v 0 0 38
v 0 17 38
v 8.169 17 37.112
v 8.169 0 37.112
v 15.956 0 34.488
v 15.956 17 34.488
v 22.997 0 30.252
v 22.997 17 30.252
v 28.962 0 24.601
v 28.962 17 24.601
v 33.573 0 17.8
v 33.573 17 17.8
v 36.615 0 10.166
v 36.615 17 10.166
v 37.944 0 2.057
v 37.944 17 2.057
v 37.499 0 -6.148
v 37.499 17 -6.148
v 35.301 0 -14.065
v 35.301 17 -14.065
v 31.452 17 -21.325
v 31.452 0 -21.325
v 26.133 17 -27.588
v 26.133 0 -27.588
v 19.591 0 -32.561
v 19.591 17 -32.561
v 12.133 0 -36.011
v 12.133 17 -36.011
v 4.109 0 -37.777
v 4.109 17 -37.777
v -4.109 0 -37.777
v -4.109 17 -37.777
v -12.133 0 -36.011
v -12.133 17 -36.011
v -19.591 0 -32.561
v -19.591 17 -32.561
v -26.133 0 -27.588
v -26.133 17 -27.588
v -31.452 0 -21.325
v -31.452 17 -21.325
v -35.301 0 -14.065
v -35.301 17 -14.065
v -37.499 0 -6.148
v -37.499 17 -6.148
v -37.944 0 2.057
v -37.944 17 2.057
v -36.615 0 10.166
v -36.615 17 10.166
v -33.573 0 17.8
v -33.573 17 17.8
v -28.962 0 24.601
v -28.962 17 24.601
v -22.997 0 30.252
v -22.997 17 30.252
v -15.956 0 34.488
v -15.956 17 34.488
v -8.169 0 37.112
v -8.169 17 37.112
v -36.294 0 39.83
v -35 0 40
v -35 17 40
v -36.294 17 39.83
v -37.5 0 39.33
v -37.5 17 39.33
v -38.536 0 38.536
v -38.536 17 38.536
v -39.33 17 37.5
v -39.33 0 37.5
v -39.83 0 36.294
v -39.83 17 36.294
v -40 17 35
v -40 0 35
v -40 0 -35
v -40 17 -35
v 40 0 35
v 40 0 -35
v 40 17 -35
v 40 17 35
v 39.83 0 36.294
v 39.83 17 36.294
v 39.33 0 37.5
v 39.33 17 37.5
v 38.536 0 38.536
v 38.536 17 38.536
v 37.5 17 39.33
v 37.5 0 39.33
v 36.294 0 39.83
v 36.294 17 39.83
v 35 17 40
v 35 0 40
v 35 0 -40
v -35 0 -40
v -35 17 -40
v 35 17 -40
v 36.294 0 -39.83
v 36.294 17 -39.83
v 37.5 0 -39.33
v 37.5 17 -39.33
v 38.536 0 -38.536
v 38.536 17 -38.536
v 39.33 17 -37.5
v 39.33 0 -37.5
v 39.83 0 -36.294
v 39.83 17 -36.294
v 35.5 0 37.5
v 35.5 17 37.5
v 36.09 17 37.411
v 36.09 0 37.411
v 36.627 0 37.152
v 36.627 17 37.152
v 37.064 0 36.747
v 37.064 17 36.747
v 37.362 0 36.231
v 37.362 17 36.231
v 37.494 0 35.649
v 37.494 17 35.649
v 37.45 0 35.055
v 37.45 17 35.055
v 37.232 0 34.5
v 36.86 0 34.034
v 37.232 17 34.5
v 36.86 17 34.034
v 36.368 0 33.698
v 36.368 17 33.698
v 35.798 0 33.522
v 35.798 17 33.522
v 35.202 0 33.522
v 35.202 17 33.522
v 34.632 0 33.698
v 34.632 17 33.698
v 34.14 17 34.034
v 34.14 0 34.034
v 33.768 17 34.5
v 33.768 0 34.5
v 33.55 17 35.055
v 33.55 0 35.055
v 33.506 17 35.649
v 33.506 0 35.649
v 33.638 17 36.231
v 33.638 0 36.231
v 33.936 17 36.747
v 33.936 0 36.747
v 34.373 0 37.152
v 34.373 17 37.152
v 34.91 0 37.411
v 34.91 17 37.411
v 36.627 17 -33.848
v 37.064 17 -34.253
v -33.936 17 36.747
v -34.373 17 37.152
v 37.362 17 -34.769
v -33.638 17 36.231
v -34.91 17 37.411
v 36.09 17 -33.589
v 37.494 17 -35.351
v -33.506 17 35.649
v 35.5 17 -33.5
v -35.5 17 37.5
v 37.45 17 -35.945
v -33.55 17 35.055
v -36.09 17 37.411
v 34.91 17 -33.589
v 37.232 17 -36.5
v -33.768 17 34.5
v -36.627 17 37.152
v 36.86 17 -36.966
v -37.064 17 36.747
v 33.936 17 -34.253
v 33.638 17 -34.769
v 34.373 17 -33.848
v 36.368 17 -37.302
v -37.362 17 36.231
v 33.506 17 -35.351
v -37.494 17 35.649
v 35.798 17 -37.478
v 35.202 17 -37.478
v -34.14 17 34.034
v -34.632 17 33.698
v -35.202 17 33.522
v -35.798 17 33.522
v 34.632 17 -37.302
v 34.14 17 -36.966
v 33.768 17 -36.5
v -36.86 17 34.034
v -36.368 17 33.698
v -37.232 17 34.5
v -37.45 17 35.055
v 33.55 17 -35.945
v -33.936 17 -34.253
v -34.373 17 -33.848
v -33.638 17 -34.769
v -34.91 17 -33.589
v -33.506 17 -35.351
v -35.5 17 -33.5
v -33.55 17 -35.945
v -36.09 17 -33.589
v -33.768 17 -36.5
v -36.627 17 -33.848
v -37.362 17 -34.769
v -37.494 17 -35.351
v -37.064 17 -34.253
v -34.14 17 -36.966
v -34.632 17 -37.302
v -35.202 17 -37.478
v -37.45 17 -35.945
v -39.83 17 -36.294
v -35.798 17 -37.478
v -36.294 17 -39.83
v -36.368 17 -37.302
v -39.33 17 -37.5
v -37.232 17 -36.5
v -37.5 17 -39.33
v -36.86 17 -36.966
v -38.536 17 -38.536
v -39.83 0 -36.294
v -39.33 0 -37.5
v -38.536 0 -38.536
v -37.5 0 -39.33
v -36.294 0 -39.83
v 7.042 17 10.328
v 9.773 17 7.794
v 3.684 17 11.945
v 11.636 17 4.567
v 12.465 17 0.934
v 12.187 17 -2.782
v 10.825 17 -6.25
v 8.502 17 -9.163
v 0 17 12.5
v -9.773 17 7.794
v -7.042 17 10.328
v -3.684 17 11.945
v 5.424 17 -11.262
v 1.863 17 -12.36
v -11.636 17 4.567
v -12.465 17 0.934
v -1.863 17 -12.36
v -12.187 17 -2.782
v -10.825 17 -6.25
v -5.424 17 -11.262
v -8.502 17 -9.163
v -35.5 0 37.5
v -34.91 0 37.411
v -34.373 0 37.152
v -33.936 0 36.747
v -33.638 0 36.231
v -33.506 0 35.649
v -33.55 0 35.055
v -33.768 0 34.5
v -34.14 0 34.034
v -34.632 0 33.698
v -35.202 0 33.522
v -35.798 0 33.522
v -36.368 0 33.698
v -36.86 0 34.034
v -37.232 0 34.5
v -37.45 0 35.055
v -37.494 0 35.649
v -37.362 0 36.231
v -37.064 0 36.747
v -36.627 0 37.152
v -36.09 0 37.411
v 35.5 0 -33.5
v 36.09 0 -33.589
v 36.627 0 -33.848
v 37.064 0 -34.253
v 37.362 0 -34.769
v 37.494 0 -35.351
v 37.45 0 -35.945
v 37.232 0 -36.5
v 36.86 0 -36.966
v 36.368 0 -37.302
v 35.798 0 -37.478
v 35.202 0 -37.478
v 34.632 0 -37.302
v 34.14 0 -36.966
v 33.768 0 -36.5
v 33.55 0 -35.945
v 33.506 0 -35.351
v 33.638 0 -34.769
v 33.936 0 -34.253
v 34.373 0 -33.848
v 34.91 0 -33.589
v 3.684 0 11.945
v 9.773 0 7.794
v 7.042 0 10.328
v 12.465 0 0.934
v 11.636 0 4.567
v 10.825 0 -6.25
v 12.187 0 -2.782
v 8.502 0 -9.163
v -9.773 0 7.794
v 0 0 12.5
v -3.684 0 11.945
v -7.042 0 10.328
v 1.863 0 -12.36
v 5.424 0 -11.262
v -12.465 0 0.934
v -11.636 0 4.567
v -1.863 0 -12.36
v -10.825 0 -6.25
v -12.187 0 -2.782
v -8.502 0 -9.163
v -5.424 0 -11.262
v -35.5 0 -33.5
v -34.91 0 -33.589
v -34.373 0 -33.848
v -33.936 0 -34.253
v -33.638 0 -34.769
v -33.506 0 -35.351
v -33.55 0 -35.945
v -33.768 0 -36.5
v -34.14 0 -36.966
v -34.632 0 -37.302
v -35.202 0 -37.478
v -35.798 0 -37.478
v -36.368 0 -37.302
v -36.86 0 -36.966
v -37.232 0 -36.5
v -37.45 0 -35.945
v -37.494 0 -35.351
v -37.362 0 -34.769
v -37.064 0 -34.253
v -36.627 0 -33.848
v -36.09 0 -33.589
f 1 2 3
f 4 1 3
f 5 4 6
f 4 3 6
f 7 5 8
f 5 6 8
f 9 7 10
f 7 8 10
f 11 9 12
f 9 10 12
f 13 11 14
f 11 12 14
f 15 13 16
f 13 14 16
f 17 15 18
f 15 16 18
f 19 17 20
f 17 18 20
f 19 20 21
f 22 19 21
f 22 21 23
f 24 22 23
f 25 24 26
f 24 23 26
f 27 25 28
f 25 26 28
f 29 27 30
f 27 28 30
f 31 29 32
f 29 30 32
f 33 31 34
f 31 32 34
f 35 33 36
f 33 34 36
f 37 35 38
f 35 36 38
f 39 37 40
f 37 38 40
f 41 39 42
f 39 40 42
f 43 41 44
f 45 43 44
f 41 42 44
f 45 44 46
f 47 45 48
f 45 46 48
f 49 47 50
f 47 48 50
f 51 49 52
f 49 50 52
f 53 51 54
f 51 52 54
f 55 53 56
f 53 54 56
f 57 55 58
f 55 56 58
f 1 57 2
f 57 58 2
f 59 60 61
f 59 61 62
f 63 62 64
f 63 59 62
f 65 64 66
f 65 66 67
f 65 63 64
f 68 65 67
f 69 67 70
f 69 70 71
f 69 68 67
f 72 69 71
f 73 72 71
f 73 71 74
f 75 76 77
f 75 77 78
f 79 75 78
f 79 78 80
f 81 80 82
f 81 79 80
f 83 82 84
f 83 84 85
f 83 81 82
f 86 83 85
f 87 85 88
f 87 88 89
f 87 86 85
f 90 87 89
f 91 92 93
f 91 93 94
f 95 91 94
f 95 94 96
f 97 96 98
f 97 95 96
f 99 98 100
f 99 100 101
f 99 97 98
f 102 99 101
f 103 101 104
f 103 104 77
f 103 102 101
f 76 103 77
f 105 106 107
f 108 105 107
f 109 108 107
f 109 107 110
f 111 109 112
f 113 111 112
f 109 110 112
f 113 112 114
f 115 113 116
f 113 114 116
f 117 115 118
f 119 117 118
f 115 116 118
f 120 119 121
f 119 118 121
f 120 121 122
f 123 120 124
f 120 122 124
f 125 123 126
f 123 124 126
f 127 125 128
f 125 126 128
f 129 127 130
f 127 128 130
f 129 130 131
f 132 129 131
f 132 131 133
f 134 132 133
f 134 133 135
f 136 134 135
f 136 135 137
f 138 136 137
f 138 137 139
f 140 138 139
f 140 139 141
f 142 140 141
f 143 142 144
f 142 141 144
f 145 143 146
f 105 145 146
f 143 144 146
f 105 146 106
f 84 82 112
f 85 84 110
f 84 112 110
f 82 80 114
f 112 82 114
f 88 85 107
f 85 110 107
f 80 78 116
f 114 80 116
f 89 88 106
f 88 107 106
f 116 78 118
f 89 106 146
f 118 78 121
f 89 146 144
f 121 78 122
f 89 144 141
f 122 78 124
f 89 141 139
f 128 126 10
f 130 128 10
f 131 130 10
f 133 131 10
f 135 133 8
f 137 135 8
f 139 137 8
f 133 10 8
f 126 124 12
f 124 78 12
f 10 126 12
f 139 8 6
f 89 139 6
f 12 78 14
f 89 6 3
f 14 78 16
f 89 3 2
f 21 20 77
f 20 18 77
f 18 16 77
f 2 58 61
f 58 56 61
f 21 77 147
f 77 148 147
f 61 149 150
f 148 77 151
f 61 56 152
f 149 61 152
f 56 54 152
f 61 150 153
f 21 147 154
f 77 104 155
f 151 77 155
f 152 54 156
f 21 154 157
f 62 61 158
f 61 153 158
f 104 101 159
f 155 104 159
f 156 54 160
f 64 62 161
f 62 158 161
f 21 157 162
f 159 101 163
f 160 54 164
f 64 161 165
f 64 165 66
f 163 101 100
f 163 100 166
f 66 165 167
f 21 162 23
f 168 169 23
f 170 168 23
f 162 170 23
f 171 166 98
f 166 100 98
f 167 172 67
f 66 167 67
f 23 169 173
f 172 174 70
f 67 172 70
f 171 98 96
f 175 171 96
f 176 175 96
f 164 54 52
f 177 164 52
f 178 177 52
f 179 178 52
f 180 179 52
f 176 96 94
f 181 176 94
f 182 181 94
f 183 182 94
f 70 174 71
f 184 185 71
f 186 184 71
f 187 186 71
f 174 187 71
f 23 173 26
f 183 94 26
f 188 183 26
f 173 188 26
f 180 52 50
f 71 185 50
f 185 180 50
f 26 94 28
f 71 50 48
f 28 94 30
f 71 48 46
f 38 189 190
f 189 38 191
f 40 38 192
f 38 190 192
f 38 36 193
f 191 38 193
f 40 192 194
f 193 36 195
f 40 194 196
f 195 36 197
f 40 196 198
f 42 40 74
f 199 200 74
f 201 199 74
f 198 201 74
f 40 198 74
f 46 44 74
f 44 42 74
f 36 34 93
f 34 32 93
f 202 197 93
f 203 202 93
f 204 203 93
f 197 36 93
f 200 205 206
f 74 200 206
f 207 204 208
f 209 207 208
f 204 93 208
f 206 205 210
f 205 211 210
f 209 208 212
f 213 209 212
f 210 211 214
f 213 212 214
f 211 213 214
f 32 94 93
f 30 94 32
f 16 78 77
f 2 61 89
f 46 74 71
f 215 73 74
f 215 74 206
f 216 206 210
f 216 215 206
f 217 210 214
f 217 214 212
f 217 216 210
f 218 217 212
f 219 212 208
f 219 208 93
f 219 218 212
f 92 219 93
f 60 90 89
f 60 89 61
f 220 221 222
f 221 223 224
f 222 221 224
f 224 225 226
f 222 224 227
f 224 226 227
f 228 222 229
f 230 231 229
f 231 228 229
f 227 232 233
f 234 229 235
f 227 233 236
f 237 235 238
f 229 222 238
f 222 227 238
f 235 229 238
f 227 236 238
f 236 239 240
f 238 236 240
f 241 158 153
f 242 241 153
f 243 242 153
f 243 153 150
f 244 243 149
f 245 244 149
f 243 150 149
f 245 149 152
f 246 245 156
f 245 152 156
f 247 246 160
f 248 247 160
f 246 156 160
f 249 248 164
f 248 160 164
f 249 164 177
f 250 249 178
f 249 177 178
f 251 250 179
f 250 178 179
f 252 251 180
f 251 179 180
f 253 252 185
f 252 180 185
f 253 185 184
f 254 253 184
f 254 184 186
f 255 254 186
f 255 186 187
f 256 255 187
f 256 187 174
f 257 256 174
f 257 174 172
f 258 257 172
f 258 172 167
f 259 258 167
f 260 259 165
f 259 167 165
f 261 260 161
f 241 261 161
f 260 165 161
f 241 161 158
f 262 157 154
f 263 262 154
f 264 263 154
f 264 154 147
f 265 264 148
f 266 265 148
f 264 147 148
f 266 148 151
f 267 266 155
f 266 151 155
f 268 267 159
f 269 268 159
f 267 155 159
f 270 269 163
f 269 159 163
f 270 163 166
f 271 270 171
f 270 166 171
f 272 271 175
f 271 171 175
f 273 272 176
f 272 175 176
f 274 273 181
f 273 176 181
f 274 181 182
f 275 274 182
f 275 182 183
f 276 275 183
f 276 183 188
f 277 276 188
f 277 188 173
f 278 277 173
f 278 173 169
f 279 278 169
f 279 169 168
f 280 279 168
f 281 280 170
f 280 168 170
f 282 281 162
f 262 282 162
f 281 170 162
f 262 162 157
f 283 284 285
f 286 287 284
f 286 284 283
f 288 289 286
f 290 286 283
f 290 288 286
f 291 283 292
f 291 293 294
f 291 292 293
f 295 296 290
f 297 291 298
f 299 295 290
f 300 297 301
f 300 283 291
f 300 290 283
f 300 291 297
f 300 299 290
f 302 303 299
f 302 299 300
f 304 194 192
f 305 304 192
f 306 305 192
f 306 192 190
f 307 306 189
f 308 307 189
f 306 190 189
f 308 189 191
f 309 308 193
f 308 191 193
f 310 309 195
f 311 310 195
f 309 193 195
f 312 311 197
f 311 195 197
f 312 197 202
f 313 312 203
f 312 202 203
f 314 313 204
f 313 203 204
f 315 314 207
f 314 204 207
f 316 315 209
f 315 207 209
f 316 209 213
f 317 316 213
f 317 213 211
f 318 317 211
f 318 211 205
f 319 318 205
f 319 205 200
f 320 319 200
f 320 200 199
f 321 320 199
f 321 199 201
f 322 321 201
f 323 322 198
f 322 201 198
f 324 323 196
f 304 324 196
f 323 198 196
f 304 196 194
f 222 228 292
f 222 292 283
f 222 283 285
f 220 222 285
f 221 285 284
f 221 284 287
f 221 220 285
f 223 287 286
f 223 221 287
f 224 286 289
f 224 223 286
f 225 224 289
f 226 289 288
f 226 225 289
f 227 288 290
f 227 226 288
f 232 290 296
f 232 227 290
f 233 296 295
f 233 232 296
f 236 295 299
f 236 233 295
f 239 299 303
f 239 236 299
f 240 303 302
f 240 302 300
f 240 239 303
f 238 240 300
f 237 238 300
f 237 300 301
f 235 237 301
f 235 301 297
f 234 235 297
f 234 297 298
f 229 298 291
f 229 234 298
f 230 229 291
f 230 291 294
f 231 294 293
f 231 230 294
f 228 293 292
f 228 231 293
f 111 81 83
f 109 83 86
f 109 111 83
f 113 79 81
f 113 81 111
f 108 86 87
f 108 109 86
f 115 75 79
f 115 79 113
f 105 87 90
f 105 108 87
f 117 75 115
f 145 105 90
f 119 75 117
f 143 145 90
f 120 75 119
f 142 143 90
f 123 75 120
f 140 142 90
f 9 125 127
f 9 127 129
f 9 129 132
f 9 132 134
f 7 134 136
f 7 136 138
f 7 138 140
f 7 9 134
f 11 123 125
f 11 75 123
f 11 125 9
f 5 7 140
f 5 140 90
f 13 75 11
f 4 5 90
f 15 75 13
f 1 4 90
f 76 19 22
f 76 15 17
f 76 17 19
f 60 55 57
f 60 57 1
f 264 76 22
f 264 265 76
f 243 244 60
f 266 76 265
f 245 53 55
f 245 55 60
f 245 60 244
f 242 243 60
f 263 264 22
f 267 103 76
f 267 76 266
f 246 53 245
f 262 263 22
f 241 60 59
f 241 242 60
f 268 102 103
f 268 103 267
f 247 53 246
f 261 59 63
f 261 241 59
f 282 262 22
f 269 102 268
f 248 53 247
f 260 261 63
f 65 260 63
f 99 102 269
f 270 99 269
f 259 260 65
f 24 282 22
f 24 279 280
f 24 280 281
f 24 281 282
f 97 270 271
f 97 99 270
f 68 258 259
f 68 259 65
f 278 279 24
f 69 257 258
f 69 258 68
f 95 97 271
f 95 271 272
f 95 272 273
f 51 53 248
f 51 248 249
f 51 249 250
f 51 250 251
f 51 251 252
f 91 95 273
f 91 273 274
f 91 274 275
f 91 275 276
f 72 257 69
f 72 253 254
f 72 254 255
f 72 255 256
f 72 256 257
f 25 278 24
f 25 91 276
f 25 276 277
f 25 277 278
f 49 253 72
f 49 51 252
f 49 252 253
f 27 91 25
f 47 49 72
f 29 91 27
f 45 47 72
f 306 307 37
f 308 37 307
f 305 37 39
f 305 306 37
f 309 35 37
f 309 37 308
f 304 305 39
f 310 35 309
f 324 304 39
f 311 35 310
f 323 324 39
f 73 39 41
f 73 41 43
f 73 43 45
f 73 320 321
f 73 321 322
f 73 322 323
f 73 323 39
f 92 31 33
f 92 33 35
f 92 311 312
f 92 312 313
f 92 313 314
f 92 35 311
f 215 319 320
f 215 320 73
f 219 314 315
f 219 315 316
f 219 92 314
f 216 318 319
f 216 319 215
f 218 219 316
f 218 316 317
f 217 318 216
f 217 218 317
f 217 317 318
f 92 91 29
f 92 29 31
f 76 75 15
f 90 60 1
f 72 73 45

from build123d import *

# Parameters (mm, degrees)
EXTRUDE_1_DEPTH     = 17
SKETCH_2_R          = 12.5
CUT_EXTRUDE_1_DEPTH = 17
SKETCH_3_R          = 38
EXTRUDE_3_DEPTH     = 17
SKETCH_4_R          = 2
CUT_EXTRUDE_2_DEPTH = 17


with BuildPart() as part:
    # 草图1 → 拉伸1 (new body)
    with BuildSketch(Plane(origin=(0, 0, 0), x_dir=(1, 0, 0), z_dir=(0, 1, 0))):
        with BuildLine():
            Line((-35, 40), (35, 40))
            ThreePointArc((35, 40), (38.535533906, 38.535533906), (40, 35))
            Line((40, 35), (40, -35))
            ThreePointArc((40, -35), (38.535533906, -38.535533906), (35, -40))
            Line((35, -40), (-35, -40))
            ThreePointArc((-35, -40), (-38.535533906, -38.535533906), (-40, -35))
            Line((-40, -35), (-40, 35))
            ThreePointArc((-40, 35), (-38.535533906, 38.535533906), (-35, 40))
        make_face()
    extrude(amount=EXTRUDE_1_DEPTH)

    # 草图2 → 切除-拉伸1 (cut)
    with BuildSketch(Plane(origin=(0, 17, 0), x_dir=(-1, 0, 0), z_dir=(0, 1, 0))):
        with BuildLine():
            Line((-35, -38), (35, -38))
            ThreePointArc((35, -38), (37.121320344, -37.121320344), (38, -35))
            Line((38, -35), (38, 35))
            ThreePointArc((38, 35), (37.121320344, 37.121320344), (35, 38))
            Line((35, 38), (-35, 38))
            ThreePointArc((-35, 38), (-37.121320344, 37.121320344), (-38, 35))
            Line((-38, 35), (-38, -35))
            ThreePointArc((-38, -35), (-37.121320344, -37.121320344), (-35, -38))
        make_face()
        with Locations(Location((0, 0, 0), (0, 0, 90))):
            Circle(SKETCH_2_R, mode=Mode.SUBTRACT)
    extrude(amount=-CUT_EXTRUDE_1_DEPTH, mode=Mode.SUBTRACT)


with BuildPart() as cut_extrude_1_piece_1:
    # of the separate pieces the step leaves, piece 1, a body of its own (cut_extrude_1_pieces)
    add(part.part.solids().sort_by_distance((-35, 0, -40))[0])

    # 草图3 → 拉伸3 (add)
    with BuildSketch(Plane(origin=(0, 17, 0), x_dir=(-1, 0, 0), z_dir=(0, 1, 0))):
        with BuildLine():
            Line((40, -35), (40, 35))
            ThreePointArc((40, 35), (38.535533906, 38.535533906), (35, 40))
            Line((35, 40), (-35, 40))
            ThreePointArc((-35, 40), (-38.535533906, 38.535533906), (-40, 35))
            Line((-40, 35), (-40, -35))
            ThreePointArc((-40, -35), (-38.535533906, -38.535533906), (-35, -40))
            Line((-35, -40), (35, -40))
            ThreePointArc((35, -40), (38.535533906, -38.535533906), (40, -35))
        make_face()
        with Locations(Location((0, 0, 0), (0, 0, 90))):
            Circle(SKETCH_3_R, mode=Mode.SUBTRACT)
    extrude(amount=-EXTRUDE_3_DEPTH)

    # 草图4 → 切除-拉伸2 (cut)
    with BuildSketch(Plane(origin=(0, 17, 0), x_dir=(-1, 0, 0), z_dir=(0, 1, 0))):
        with Locations(Location((-35.5, -35.5, 0), (0, 0, 90))):
            Circle(SKETCH_4_R)
        with Locations(Location((-35.5, 35.5, 0), (0, 0, 90))):
            Circle(SKETCH_4_R)
        with Locations(Location((35.5, 35.5, 0), (0, 0, 90))):
            Circle(SKETCH_4_R)
        with Locations(Location((35.5, -35.5, 0), (0, 0, 90))):
            Circle(SKETCH_4_R)
    extrude(amount=-CUT_EXTRUDE_2_DEPTH, mode=Mode.SUBTRACT)


with BuildPart() as cut_extrude_1_piece_2:
    # of the separate pieces the step leaves, piece 2, a body of its own (cut_extrude_1_pieces)
    add(part.part.solids().sort_by_distance((0, 0, 12.5))[0])


solid = Compound([cut_extrude_1_piece_1.part, cut_extrude_1_piece_2.part])
